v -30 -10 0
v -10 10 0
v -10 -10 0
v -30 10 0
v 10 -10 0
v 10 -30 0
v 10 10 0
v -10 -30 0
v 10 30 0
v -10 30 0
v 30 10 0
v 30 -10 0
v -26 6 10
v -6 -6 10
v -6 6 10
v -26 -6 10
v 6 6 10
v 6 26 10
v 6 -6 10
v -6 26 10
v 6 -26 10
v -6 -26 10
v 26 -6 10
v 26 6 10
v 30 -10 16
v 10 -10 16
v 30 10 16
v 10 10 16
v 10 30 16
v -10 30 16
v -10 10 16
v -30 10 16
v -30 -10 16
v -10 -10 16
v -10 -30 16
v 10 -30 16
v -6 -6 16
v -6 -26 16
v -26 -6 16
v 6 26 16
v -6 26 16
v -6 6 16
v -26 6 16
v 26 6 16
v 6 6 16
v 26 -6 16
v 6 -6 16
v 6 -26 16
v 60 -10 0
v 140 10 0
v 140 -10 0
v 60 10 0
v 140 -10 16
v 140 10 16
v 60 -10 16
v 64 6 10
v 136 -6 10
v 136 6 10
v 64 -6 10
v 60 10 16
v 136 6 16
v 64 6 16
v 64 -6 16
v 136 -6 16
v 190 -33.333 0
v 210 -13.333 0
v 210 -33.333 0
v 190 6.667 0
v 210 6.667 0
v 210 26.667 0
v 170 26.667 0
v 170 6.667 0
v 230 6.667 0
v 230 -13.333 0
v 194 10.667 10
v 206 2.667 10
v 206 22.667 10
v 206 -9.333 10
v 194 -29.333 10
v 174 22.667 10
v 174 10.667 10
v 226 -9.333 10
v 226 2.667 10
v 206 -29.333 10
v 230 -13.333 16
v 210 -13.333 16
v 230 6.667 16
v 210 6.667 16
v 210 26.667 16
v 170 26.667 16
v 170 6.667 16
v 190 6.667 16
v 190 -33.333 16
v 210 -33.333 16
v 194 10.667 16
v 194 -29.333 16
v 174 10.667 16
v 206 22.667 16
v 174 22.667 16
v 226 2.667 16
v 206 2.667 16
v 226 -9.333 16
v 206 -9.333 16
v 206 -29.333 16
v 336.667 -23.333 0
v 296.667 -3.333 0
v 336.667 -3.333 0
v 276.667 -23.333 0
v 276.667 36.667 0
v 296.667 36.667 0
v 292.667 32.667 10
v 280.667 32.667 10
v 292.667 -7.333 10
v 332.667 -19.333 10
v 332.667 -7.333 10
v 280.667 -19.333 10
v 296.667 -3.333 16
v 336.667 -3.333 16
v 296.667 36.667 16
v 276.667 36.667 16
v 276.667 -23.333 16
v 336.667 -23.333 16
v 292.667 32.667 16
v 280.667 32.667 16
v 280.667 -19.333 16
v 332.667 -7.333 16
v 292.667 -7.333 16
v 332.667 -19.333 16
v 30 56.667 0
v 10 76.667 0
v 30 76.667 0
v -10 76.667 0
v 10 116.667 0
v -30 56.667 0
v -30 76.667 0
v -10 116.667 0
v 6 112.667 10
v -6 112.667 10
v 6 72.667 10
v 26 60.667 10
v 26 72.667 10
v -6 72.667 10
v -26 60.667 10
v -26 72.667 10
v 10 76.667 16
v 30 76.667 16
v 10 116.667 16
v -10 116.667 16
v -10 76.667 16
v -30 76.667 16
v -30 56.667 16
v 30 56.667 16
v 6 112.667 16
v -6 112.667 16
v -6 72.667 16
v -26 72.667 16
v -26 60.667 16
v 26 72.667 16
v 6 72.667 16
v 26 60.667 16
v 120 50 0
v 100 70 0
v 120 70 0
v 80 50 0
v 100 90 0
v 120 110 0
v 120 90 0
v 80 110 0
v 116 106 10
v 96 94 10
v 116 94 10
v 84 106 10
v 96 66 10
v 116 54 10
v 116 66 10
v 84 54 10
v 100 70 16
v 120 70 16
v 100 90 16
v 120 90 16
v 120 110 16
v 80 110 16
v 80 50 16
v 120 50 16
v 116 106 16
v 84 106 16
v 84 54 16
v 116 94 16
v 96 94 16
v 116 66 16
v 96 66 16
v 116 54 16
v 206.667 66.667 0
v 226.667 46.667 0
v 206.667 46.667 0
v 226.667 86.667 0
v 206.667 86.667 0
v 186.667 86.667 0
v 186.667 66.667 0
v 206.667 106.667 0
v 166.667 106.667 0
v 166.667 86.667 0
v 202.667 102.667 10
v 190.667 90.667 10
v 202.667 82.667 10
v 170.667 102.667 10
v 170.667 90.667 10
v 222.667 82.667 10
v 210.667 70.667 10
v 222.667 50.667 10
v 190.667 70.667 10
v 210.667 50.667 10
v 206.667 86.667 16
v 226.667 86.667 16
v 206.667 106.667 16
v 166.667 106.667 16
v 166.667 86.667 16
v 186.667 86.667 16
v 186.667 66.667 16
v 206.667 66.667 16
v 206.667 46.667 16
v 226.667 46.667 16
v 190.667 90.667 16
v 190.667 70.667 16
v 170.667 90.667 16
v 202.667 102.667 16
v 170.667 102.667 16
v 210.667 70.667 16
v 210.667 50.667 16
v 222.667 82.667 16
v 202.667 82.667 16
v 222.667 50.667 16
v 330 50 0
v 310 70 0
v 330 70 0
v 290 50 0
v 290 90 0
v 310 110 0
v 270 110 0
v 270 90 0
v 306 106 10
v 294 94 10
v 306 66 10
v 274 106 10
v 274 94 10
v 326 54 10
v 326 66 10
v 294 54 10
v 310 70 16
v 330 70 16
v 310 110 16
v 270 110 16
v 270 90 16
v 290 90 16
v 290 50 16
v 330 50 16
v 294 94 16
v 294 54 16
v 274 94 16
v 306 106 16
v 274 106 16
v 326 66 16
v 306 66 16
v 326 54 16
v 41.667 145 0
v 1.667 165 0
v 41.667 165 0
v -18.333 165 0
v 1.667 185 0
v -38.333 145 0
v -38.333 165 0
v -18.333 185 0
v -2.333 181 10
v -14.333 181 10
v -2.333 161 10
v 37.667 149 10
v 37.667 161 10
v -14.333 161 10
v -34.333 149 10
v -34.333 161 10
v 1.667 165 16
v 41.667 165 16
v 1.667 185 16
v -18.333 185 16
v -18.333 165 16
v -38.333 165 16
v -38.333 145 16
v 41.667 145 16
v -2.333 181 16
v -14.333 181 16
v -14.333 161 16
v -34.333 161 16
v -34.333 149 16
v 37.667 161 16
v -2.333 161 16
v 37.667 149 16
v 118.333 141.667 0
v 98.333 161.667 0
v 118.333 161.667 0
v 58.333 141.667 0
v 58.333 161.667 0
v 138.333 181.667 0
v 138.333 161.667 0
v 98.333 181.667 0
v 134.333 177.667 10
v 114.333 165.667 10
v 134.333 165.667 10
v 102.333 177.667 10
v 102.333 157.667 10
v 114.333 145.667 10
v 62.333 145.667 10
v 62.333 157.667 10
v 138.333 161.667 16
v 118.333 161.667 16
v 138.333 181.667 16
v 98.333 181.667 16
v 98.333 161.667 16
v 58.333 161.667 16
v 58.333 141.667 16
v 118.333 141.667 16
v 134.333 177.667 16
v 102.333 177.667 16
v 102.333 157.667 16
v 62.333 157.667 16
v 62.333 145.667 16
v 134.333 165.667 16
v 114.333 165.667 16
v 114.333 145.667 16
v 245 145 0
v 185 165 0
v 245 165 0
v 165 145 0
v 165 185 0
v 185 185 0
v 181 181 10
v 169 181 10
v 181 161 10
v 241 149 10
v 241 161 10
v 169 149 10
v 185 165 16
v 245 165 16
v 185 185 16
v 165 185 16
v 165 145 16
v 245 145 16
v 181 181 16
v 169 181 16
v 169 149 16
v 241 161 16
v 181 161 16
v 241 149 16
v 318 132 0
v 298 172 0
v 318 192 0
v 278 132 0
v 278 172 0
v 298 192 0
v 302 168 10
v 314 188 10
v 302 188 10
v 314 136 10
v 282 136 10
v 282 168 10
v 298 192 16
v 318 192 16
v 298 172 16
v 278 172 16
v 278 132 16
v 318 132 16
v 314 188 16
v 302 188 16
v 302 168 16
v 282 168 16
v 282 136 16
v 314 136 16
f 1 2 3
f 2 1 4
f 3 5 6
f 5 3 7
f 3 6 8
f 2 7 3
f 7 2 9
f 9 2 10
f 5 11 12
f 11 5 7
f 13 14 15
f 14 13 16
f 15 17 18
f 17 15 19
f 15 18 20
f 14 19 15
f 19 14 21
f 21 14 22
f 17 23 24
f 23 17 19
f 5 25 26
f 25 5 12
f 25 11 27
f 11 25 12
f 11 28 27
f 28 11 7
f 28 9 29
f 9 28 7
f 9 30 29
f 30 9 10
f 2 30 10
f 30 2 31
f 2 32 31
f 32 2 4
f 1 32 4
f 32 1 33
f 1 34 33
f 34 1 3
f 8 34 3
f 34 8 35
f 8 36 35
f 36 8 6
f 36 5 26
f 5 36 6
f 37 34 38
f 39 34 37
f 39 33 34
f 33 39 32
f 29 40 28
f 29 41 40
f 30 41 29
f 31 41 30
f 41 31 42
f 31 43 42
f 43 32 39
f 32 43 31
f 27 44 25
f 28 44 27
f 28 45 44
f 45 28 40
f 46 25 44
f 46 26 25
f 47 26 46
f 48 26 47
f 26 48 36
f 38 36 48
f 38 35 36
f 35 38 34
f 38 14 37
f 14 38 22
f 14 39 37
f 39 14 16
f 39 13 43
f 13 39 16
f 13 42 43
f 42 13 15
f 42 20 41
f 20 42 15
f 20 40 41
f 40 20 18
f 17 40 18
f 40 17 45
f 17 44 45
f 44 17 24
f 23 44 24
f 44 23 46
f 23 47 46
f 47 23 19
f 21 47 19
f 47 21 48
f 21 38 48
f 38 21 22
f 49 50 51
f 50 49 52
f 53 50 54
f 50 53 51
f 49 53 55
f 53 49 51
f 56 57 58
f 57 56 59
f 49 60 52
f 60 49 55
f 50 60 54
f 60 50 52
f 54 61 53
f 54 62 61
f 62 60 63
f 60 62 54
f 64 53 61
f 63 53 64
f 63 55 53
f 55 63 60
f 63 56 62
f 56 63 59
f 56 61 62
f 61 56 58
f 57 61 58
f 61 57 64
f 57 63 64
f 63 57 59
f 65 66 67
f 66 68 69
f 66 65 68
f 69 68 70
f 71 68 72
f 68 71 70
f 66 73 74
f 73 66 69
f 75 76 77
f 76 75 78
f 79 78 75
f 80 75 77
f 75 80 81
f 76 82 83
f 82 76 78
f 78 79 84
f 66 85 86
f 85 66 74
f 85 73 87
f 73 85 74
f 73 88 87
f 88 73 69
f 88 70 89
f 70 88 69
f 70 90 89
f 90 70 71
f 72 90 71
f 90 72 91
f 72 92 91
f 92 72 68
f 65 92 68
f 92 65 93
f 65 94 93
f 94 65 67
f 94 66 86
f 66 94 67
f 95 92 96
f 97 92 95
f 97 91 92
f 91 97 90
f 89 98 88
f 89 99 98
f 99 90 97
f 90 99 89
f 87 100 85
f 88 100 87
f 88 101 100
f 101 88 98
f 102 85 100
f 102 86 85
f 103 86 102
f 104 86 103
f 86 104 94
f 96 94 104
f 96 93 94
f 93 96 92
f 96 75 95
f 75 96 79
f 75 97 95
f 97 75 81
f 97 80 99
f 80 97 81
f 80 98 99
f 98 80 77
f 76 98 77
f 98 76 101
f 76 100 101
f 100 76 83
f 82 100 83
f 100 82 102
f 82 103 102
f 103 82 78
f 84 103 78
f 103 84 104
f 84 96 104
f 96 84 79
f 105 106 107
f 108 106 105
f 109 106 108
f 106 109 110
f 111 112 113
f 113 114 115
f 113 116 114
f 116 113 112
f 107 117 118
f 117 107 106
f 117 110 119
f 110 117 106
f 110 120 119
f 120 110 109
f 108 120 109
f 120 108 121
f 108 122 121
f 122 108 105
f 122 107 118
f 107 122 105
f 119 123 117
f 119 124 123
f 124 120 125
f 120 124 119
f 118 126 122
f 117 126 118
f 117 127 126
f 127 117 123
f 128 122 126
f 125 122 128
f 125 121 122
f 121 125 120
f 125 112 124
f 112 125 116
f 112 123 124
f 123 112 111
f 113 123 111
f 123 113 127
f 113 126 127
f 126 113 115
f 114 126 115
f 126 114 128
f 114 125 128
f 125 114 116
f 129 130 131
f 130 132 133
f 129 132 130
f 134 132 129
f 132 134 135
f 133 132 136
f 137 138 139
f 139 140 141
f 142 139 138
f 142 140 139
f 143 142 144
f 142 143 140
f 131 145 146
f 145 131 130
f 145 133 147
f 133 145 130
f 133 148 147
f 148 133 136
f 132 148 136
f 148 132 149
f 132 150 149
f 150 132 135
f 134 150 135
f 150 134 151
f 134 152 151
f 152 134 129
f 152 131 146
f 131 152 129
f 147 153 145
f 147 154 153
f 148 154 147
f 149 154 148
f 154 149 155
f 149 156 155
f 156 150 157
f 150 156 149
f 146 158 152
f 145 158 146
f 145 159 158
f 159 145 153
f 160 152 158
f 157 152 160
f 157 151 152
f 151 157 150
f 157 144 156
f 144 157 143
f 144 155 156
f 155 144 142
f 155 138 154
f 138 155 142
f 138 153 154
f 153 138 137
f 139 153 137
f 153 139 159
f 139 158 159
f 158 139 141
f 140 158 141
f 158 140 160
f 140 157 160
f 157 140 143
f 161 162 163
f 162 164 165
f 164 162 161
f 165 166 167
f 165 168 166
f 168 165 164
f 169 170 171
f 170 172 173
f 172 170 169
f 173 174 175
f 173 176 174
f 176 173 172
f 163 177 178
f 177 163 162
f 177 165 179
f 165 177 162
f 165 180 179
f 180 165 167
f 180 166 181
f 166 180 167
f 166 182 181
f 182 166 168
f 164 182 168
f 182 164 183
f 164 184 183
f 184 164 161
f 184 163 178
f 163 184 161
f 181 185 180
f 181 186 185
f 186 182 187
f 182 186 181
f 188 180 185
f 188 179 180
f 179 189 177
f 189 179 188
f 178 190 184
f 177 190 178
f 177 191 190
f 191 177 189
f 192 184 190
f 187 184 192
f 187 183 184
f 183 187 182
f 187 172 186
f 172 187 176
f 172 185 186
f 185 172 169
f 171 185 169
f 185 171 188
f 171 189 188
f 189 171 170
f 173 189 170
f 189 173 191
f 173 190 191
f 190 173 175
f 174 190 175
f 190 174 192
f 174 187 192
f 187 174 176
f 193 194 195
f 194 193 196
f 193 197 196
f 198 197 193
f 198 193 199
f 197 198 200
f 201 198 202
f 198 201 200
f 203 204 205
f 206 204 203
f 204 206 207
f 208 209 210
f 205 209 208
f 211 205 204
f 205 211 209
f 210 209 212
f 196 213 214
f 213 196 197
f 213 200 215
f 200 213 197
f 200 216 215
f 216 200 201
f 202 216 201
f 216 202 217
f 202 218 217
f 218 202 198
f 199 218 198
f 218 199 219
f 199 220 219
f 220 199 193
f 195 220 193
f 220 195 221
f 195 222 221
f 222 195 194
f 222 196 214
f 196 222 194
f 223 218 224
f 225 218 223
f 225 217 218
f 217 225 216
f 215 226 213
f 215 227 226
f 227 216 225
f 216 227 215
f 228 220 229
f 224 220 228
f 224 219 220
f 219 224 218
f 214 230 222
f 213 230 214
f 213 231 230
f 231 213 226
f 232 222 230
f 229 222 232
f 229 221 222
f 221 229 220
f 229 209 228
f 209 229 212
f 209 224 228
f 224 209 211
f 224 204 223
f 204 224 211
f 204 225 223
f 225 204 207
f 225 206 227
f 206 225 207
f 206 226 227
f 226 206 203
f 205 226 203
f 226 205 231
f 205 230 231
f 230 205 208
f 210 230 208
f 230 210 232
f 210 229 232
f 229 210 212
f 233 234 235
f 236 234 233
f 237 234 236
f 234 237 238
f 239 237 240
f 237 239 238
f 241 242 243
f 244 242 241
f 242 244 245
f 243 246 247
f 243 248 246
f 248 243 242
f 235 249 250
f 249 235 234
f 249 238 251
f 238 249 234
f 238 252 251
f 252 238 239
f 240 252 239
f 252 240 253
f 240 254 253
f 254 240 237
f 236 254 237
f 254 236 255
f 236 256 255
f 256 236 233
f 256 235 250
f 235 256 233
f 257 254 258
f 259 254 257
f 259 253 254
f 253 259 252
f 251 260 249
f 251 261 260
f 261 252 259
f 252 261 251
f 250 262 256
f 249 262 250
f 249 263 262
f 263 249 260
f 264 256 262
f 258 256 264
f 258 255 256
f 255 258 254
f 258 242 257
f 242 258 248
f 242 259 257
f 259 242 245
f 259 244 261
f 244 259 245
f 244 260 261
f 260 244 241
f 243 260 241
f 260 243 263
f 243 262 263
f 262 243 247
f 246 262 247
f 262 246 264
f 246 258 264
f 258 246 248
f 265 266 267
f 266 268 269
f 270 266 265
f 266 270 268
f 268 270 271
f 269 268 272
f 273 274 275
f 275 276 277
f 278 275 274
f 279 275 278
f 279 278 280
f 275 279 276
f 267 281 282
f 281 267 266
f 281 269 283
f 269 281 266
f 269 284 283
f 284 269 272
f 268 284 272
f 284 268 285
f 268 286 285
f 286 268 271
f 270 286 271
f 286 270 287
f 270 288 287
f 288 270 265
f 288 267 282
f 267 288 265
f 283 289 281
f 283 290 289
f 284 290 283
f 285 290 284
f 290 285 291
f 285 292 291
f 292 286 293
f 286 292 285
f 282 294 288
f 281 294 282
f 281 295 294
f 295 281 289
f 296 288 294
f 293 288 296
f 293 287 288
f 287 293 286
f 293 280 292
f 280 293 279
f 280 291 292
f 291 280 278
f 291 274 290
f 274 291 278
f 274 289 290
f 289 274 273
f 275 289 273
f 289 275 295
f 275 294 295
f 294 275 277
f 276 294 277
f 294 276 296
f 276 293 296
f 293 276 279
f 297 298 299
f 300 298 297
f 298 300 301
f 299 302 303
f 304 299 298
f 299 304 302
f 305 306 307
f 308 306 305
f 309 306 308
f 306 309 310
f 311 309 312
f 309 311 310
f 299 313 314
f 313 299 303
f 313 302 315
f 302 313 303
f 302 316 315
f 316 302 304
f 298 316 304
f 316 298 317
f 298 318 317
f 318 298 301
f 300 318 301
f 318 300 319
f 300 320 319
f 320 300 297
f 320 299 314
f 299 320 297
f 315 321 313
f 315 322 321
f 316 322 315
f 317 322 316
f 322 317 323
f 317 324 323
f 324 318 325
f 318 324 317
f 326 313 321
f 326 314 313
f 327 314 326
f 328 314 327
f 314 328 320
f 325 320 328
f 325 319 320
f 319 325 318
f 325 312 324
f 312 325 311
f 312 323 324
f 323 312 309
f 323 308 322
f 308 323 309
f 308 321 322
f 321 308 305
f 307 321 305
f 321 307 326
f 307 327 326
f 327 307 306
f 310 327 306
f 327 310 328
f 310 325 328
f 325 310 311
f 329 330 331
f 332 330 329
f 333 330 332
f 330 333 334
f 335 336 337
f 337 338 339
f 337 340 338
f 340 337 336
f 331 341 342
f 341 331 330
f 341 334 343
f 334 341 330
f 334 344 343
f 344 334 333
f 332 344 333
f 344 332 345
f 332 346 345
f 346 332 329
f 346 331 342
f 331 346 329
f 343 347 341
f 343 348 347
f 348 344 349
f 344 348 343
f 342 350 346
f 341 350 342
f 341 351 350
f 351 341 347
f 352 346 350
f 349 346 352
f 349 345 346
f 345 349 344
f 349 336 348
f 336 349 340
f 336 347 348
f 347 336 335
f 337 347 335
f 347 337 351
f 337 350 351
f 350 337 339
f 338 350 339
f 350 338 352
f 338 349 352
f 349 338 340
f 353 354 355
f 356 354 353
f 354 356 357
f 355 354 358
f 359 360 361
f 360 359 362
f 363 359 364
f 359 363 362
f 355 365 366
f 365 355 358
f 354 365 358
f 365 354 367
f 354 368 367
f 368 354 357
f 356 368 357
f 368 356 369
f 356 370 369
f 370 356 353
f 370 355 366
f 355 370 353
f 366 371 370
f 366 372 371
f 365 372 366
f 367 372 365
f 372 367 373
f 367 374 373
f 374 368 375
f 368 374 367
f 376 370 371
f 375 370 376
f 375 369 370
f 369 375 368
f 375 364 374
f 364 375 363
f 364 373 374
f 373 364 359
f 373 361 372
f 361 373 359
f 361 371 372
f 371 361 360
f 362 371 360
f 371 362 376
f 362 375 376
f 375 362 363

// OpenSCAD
/*
Pentominos using Freeman codes

Kit Wallace 2019-03-17

*/
//use <../lib/tile_fns.scad>
//overall scale 
scale=20;
//height of base tile = 0 for 2d tiles
base_height=0.5;
//defines the overall base offset/ inset - tune for snug fit
base_offset=0;
//height of border
border_height=0.3;
//thickness of border
border_thickness=0.2;
// polyomino to print 0..11  -1 = all
pentomino=-1;
// for chiral shapes : 0 = as given 1 = mirror
mirror=0;

pentominoes=[
    "030101212323",
    "0000122223",
    "033010121223",
    "333000122112",
    "000121123323",
    "333001210122",
    "303030112122",
    "033001211223",
    "000012212323",
    "000101223223",
    "000012221233",
    "0011123233"
    ];
// echo(pentominos);
scale(scale)

if (pentomino==-1)   
   for(i=[0:len(pentominoes)-1]) {  
      translate([5*(i%4),4*floor(i/4)]) {
         code=pentominoes[i];
         print_polyomino(code);
      }
   }
else {
    c = pentominoes[pentomino];
    if (mirror==0)
       print_polyomino(c);
    else { mc=mirror_code(c);
           print_polyomino(mc);
        } 
    } 
 

module print_polyomino(code) {    
   tile=centre_tile(freeman4_to_tile(code));
//   echo(tile);
   if (base_height >0)
   union() {
      linear_extrude(height=base_height)
        offset(delta=base_offset)
          polygon(tile);
      translate([0,0,base_height])
        linear_extrude(height=border_height)
        difference(){
            offset(delta=base_offset)
                polygon(tile);
            offset(delta=-border_thickness)
               polygon(tile);       
        }
    } 
   else 
     difference() {
        offset(delta=base_offset)
         polygon(tile);  
        offset(delta=-border_thickness)
         polygon(tile);  

     } 
}

function freeman4_to_tile(code,point=[0,0],i=0) =
     i == len(code)
     ?  []
     :  let (m=code[i])
        let (diff =
              m=="0" ? [1,0]
             :m=="1" ? [0,1]
             :m=="2" ? [-1,0]
             :m=="3" ? [0,-1]
             :[0,0])
        let (next = point + diff)
        concat([point],freeman4_to_tile(code,next,i+1) )
     ;


function mirror_code(code,i=0) =
    i <len(code)
     ? let(m=code[i])
       let(c=
           m=="0" ? "2"
         : m=="2" ? "0"
         : m)
       str(c,mirror_code(code,i+1))
     :"";
   
function v_sum(v,i=0)=
    i<len(v)
      ? v[i]+v_sum(v,i+1)
      : [0,0] ;
         
function centre_tile(t) =
    let(c = v_sum(t) / len(t))
    [for (p=t) p-c];
